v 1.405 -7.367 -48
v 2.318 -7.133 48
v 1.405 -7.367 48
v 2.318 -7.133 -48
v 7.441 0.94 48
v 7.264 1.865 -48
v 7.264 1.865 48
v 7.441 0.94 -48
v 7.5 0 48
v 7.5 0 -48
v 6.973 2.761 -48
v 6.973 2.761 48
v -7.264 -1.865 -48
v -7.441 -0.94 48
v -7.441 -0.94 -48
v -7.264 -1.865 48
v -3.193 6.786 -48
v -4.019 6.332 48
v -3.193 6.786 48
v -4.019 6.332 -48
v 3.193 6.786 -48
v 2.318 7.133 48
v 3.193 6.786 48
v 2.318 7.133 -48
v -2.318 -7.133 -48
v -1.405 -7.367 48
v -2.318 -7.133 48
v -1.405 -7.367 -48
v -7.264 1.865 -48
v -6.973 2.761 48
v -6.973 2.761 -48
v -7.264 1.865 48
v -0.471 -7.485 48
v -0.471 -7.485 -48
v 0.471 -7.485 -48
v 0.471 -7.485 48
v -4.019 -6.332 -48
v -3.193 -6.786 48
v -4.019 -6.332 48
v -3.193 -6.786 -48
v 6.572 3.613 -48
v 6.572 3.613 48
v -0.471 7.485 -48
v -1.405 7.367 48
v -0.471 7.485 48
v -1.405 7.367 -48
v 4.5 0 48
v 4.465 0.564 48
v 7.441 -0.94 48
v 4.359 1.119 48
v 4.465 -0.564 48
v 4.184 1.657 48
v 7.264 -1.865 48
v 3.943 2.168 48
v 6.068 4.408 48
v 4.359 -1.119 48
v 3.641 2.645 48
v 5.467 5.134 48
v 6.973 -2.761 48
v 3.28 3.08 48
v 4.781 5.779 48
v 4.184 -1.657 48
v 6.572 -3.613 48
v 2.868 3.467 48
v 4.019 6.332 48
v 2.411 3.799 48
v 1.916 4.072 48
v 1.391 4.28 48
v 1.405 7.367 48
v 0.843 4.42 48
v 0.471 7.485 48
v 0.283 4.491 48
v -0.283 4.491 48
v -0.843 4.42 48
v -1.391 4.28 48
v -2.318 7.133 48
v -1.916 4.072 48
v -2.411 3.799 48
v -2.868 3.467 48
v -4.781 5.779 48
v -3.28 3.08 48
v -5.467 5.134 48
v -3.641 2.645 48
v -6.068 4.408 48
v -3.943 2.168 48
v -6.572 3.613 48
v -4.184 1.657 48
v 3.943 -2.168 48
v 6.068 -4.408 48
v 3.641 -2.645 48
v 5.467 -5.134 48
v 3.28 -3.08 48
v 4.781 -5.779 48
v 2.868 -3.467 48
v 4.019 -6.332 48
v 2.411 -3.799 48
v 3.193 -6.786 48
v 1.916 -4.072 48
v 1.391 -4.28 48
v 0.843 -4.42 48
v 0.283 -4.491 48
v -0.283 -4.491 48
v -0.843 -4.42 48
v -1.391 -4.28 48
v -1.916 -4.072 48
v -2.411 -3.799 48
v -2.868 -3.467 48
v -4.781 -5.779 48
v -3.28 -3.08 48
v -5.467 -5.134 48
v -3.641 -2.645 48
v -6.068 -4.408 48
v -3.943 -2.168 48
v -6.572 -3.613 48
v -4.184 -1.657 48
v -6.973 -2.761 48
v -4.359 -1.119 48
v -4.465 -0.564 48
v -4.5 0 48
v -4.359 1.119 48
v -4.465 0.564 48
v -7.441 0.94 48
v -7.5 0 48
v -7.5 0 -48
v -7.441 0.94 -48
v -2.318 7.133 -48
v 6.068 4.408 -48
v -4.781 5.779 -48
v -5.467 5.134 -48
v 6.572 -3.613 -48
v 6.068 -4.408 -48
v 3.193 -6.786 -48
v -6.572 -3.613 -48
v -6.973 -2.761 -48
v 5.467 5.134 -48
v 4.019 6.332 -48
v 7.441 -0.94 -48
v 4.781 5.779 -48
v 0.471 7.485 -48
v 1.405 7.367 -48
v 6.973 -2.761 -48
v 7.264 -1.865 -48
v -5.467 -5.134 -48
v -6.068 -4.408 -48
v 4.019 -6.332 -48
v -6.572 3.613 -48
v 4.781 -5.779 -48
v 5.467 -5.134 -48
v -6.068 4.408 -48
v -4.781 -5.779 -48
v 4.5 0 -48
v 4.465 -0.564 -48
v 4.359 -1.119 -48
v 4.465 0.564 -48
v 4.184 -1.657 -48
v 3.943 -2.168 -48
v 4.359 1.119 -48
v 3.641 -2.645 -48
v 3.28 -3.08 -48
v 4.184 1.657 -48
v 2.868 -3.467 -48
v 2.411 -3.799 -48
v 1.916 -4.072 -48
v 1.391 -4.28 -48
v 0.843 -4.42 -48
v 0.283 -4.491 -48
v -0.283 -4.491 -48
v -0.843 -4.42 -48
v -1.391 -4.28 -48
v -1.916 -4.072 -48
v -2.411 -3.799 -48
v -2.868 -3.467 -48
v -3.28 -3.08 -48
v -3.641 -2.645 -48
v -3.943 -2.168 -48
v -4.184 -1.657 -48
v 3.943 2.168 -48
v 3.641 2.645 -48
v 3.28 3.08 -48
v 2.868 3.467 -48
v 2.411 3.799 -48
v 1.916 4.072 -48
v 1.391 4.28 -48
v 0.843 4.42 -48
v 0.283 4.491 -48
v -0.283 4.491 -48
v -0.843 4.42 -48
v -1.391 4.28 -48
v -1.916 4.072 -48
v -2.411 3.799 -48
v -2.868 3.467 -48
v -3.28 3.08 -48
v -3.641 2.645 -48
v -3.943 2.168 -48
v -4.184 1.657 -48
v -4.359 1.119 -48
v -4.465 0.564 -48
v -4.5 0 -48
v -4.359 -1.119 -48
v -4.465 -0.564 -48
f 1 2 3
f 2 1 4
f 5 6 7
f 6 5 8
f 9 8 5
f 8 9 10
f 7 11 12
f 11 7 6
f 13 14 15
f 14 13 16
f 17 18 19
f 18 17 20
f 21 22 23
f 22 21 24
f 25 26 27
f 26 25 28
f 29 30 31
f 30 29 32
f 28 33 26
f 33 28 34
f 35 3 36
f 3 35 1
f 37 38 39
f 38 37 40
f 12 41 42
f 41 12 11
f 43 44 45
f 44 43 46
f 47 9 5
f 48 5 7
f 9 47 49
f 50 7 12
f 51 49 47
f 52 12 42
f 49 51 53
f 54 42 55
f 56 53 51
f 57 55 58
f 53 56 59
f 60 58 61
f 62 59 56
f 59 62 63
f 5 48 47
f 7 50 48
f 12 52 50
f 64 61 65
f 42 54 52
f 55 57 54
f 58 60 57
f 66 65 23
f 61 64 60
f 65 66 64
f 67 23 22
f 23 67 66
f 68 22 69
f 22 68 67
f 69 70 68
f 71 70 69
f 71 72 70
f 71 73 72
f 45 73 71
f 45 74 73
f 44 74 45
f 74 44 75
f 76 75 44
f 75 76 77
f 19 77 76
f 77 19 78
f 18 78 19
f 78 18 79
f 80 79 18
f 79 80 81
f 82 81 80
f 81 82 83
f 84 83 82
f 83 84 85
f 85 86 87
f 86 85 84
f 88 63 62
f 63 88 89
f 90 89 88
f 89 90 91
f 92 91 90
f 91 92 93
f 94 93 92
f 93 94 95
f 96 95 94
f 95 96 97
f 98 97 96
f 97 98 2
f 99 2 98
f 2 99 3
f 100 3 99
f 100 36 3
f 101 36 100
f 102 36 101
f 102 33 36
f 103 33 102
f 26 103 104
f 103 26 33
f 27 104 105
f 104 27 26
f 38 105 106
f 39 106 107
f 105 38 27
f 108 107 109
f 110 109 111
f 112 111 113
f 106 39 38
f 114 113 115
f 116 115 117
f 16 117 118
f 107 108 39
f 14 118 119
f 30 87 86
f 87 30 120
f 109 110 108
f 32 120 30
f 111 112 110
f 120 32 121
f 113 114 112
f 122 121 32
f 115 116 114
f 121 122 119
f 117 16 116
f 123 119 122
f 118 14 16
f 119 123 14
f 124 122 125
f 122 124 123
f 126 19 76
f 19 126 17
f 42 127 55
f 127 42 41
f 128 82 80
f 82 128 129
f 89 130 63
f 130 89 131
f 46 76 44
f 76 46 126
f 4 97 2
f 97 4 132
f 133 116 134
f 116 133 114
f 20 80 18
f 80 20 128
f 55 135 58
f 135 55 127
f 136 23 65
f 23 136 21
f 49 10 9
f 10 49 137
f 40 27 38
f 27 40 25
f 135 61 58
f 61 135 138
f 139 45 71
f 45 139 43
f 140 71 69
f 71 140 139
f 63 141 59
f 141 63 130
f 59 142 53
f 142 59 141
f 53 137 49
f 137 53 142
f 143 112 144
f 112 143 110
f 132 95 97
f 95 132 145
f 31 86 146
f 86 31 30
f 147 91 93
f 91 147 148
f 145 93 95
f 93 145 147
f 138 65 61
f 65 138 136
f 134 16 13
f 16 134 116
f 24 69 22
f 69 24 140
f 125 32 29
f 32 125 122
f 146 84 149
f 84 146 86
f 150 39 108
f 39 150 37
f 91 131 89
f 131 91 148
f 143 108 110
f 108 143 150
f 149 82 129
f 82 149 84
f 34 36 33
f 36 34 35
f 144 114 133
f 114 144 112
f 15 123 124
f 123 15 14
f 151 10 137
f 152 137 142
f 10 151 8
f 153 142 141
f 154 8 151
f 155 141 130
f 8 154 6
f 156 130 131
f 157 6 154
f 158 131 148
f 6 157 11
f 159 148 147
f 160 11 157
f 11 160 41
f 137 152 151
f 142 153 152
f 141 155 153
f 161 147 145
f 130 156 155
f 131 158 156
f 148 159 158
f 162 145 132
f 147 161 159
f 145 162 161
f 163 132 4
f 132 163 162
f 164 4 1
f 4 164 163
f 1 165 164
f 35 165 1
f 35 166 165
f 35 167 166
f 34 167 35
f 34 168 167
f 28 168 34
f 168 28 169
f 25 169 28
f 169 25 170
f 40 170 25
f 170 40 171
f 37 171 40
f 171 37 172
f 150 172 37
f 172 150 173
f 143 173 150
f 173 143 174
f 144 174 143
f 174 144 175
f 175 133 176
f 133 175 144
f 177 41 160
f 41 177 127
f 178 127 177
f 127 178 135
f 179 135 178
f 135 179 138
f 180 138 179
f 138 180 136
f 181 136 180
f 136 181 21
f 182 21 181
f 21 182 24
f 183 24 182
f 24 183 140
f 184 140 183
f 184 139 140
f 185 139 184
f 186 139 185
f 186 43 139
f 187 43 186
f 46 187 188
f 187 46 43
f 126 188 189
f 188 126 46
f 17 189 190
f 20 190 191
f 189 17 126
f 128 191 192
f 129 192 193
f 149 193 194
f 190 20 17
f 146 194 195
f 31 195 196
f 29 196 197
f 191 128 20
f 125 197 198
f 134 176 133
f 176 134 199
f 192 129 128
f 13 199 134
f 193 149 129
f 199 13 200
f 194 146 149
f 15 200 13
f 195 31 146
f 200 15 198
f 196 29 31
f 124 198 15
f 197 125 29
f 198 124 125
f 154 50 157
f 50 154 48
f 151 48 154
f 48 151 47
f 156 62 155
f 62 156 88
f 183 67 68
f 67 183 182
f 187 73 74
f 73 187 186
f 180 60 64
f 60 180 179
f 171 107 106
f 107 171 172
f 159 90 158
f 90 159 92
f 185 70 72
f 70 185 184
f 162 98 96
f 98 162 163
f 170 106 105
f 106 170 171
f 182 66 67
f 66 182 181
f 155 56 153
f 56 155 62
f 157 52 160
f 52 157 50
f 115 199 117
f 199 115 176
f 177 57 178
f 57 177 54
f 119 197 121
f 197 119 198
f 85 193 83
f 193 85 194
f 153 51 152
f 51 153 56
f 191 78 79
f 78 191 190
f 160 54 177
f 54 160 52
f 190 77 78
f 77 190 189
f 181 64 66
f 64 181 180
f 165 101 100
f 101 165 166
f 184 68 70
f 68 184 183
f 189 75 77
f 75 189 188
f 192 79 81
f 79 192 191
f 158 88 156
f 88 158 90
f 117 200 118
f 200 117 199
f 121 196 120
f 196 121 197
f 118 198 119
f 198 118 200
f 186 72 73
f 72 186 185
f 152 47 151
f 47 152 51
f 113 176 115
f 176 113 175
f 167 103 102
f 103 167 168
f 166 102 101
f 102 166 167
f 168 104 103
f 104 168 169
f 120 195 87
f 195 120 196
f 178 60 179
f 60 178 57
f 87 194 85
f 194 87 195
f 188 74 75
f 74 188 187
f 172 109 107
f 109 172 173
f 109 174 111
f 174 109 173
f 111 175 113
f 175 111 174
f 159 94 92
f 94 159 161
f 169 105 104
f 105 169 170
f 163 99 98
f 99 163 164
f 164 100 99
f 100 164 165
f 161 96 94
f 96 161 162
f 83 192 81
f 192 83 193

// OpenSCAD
$fn = 50;


difference() {
	union() {
		translate(v = [0, 0, -48.0000000000]) {
			cylinder(h = 96, r = 7.5000000000);
		}
	}
	union() {
		translate(v = [0, 0, -100.0000000000]) {
			cylinder(h = 200, r = 4.5000000000);
		}
	}
}
